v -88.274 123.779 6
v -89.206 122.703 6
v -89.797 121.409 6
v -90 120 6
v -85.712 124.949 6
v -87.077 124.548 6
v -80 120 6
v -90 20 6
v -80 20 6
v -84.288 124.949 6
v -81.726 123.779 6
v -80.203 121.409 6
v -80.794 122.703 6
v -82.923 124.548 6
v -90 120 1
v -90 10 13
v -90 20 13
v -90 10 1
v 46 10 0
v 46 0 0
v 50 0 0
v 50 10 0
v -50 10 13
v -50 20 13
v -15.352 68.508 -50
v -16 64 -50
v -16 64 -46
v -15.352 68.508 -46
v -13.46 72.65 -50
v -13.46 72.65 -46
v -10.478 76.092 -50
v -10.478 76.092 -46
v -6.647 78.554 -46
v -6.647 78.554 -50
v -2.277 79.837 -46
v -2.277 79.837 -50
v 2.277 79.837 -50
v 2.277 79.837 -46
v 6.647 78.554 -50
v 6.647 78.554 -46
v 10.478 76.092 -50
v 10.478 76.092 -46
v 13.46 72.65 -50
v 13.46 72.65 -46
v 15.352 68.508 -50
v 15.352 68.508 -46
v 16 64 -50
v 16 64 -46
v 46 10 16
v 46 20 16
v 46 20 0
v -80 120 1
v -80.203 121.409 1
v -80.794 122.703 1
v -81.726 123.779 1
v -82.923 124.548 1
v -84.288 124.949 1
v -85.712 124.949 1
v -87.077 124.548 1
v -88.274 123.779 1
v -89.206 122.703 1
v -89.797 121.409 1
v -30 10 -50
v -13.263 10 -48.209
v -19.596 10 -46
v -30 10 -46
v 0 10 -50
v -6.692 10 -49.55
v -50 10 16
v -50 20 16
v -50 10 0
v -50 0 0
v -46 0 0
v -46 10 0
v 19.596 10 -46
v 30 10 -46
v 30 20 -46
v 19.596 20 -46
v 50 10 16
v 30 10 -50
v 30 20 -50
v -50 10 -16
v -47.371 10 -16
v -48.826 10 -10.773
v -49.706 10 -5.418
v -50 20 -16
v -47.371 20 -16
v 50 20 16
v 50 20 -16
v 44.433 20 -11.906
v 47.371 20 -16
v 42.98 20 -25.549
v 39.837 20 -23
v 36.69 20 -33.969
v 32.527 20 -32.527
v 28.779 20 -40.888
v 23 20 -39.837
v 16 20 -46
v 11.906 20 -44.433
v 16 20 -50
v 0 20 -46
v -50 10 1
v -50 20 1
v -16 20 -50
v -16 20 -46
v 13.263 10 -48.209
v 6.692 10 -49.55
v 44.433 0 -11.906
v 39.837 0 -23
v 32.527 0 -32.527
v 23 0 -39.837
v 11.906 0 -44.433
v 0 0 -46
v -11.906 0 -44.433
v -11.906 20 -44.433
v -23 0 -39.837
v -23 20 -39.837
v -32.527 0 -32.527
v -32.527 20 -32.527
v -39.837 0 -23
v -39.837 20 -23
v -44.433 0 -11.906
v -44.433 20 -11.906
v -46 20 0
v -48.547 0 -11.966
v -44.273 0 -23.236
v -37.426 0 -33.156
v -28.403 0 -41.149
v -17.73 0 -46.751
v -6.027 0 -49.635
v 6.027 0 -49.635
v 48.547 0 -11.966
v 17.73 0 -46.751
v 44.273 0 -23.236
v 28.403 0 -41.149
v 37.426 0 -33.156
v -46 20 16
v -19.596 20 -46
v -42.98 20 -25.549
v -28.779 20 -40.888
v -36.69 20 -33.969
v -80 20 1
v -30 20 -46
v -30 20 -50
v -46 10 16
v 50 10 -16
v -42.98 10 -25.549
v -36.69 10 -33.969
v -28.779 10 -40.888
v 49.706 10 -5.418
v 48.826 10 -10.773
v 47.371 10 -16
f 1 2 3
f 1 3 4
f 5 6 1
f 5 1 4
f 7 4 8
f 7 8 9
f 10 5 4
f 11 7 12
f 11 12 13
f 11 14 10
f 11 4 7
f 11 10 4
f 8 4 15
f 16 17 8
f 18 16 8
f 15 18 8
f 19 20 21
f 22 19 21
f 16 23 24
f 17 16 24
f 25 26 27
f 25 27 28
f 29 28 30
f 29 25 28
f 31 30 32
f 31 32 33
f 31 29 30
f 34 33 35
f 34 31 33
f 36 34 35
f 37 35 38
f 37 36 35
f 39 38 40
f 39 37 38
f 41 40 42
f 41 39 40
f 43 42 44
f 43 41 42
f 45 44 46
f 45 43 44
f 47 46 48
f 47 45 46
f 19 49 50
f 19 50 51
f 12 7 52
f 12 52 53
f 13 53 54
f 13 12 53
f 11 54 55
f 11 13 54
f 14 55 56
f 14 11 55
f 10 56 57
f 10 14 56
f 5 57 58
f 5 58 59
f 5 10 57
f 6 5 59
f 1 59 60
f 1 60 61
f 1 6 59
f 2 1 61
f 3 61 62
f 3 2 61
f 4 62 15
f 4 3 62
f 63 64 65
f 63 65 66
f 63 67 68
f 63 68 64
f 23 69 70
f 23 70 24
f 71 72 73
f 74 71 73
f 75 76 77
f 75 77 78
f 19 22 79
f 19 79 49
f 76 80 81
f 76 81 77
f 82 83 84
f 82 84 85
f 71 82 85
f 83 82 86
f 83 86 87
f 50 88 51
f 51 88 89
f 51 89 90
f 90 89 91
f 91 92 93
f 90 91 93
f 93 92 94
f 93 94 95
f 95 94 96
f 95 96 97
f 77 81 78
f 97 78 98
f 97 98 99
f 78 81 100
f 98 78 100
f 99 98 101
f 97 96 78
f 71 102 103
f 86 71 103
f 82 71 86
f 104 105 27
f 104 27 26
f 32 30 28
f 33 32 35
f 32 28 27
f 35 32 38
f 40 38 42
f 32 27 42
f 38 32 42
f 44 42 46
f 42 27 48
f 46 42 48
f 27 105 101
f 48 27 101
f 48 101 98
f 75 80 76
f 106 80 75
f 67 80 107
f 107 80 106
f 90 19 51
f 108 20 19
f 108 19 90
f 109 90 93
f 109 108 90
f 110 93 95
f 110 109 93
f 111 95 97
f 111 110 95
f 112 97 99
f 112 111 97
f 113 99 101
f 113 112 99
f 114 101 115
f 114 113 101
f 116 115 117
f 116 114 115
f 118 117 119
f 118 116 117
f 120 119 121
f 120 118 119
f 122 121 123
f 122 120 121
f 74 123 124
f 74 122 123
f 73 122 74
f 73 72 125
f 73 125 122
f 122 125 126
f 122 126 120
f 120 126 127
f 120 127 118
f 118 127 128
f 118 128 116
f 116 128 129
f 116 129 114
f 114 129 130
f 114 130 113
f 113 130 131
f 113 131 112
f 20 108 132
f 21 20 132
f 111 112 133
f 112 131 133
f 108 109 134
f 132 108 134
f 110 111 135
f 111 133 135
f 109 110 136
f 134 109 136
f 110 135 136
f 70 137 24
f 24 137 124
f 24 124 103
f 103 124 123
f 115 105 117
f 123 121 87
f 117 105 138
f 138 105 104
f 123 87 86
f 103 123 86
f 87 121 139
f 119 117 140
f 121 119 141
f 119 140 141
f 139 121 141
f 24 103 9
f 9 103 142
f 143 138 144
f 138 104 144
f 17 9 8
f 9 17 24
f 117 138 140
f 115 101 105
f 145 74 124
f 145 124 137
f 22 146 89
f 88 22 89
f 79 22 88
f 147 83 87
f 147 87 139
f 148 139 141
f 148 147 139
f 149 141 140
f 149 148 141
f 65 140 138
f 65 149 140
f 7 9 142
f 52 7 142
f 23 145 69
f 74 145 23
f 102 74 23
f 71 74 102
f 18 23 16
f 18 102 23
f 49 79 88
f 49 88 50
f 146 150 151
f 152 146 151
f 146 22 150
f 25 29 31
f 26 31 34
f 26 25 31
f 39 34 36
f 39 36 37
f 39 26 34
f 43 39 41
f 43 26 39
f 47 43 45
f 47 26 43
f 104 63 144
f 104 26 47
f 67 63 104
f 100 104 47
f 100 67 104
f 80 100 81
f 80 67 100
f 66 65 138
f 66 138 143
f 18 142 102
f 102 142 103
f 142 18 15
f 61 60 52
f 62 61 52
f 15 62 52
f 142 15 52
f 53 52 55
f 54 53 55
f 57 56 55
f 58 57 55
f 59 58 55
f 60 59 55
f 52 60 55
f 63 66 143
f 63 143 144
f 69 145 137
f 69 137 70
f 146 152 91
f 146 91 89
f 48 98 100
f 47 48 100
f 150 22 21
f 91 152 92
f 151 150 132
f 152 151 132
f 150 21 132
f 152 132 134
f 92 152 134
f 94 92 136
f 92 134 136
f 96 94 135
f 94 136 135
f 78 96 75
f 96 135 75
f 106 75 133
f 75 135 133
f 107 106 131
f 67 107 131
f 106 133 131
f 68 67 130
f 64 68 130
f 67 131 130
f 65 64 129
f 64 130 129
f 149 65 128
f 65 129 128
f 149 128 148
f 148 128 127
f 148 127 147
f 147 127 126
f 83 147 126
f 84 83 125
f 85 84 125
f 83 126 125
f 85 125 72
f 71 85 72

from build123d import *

# Parameters (mm, degrees)
EXTRUDE_1_DEPTH     = 10
EXTRUDE_2_DEPTH     = 10
SKETCH_4_W          = 32
SKETCH_4_H          = 4
EXTRUDE_3_DEPTH     = 60
CUT_EXTRUDE_1_DEPTH = 30
SKETCH_6_W          = 12
SKETCH_6_H          = 10
EXTRUDE_4_DEPTH     = 40
SKETCH_7_W          = 10
SKETCH_7_H          = 5
EXTRUDE_5_DEPTH     = 100
SKETCH_9_R          = 5
EXTRUDE_7_DEPTH     = 5


with BuildPart() as part:
    # 草图1 → 凸台-拉伸1 (new body)
    with BuildSketch(Plane(origin=(0, 0, 0), x_dir=(1, 0, 0), z_dir=(0, 1, 0))):
        with BuildLine():
            Line((-50, 0), (-46, 0))
            ThreePointArc((-46, 0), (0, 46), (46, 0))
            Line((46, 0), (50, 0))
            ThreePointArc((50, 0), (0, 50), (-50, 0))
        make_face()
    extrude(amount=EXTRUDE_1_DEPTH)

    # 草图3 → 凸台-拉伸2 (add)
    with BuildSketch(Plane(origin=(0, 10, 0), x_dir=(1, 0, 0), z_dir=(0, 1, 0))):
        with BuildLine():
            Line((-50, 16), (-47.370877129, 16))
            ThreePointArc((-47.370877129, 16), (-36.689752119, 33.968545589), (-19.595917942, 46))
            Line((-19.595917942, 46), (-30, 46))
            Line((-30, 46), (-30, 50))
            Line((-30, 50), (30, 50))
            Line((30, 50), (30, 46))
            Line((30, 46), (19.595917942, 46))
            ThreePointArc((19.595917942, 46), (36.689752119, 33.968545589), (47.370877129, 16))
            Line((47.370877129, 16), (50, 16))
            Line((50, 16), (50, -16))
            Line((50, -16), (46, -16))
            Line((46, -16), (46, 0))
            ThreePointArc((46, 0), (0, 46), (-46, 0))
            Line((-46, 0), (-46, -16))
            Line((-46, -16), (-50, -16))
            Line((-50, -16), (-50, 16))
        make_face()
    extrude(amount=EXTRUDE_2_DEPTH)

    # 草图4 → 凸台-拉伸3 (add)
    with BuildSketch(Plane(origin=(0, 20, 0), x_dir=(1, 0, 0), z_dir=(0, 1, 0))):
        with Locations((0, 48)):
            Rectangle(SKETCH_4_W, SKETCH_4_H)
    extrude(amount=EXTRUDE_3_DEPTH)

    # 草图5 → 切除-拉伸1 (cut)
    with BuildSketch(Plane(origin=(0, 0, -50), x_dir=(-1, 0, 0), z_dir=(0, 0, -1))):
        with BuildLine():
            Line((-16, 64), (-16, 97.905328476))
            Line((-16, 97.905328476), (16, 97.905328476))
            Line((16, 97.905328476), (16, 64))
            ThreePointArc((16, 64), (0, 80), (-16, 64))
        make_face()
    extrude(amount=-CUT_EXTRUDE_1_DEPTH, mode=Mode.SUBTRACT)

    # 草图6 → 凸台-拉伸4 (add)
    with BuildSketch(Plane.ZY.offset(50)):
        with Locations((7, 15)):
            Rectangle(SKETCH_6_W, SKETCH_6_H)
    extrude(amount=EXTRUDE_4_DEPTH)

    # 草图7 → 凸台-拉伸5 (add)
    with BuildSketch(Plane(origin=(0, 20, 0), x_dir=(1, 0, 0), z_dir=(0, 1, 0))):
        with Locations((-85, -3.5)):
            Rectangle(SKETCH_7_W, SKETCH_7_H)
    extrude(amount=EXTRUDE_5_DEPTH)

    # 草图9 → 凸台-拉伸7 (add)
    with BuildSketch(Plane.XY.offset(6)):
        with Locations((-85, 120)):
            Circle(SKETCH_9_R)
    extrude(amount=-EXTRUDE_7_DEPTH)


solid = part.part
